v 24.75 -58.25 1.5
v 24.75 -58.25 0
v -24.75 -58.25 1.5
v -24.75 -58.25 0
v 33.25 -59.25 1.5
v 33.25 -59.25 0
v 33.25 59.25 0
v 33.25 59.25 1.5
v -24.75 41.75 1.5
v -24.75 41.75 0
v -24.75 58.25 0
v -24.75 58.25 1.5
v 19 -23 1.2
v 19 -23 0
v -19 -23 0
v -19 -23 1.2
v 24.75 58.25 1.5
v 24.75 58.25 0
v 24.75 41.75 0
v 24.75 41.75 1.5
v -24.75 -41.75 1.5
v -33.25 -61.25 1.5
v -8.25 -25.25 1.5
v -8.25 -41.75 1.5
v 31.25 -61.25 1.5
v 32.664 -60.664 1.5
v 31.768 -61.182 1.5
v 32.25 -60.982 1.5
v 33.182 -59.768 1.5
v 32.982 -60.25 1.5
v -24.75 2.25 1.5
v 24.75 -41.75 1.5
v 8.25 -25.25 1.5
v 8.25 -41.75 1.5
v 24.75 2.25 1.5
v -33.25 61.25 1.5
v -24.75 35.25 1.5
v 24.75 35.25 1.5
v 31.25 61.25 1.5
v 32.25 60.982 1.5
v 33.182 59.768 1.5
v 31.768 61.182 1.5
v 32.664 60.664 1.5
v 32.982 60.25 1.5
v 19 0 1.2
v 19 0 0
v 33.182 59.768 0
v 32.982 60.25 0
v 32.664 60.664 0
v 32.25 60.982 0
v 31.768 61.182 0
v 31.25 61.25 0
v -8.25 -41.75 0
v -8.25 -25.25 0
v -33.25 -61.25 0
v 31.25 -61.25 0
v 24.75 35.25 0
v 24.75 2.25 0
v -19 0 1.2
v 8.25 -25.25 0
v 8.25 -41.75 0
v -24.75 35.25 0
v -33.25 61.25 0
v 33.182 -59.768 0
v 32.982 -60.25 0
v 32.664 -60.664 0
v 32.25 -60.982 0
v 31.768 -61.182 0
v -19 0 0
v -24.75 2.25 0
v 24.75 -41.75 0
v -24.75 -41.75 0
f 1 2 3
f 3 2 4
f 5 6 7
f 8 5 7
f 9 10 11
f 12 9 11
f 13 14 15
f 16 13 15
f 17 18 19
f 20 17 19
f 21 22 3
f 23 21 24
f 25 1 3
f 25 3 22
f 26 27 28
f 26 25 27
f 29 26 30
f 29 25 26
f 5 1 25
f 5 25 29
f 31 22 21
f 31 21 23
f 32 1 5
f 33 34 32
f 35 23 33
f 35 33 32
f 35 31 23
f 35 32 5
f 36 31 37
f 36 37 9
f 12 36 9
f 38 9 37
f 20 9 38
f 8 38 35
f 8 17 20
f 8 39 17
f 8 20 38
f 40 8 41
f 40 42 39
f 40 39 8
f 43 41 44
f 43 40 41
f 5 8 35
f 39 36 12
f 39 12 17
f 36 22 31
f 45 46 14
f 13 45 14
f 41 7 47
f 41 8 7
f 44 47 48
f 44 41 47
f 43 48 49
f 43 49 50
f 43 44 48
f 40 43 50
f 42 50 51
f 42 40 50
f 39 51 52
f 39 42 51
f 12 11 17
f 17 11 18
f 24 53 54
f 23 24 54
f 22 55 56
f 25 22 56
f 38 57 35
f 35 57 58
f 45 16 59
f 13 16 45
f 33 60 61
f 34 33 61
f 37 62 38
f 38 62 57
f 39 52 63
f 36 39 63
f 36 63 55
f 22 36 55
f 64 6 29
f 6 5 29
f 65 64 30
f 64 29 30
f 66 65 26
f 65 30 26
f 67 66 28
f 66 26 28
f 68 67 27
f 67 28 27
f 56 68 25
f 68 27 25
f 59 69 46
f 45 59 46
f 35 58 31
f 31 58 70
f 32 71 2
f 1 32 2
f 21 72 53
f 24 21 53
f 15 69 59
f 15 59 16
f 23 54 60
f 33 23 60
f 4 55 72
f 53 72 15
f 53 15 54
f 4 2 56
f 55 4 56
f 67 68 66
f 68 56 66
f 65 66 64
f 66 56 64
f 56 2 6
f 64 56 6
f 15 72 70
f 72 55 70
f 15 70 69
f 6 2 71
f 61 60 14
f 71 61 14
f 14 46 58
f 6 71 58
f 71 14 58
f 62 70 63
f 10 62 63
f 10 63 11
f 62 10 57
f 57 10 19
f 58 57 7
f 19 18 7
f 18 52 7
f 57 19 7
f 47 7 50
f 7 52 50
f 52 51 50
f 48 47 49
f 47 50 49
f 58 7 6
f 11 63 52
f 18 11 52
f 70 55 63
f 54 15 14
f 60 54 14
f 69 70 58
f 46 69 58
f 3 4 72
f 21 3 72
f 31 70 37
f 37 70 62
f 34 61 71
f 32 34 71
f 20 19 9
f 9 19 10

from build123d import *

# Parameters (mm, degrees)
F1_DEPTH = 1.5
F2_W     = 19
F2_H     = 23
F3_DEPTH = 1.2
F4_R     = 2


with BuildPart() as f1:
    # F0 (on Top) → F1 (new body)
    with BuildSketch(Plane.XY):
        Polygon((33.25, -61.25), (33.25, 61.25), (0, 61.25), (-33.25, 61.25), (-33.25, -61.25), (0, -61.25), align=None)
        Polygon((24.75, -58.25), (0, -58.25), (-24.75, -58.25), (-24.75, -41.75), (-8.25, -41.75), (-8.25, -25.25), (8.25, -25.25), (8.25, -41.75), (24.75, -41.75), align=None, mode=Mode.SUBTRACT)
        Polygon((-24.75, 35.25), (0, 35.25), (24.75, 35.25), (24.75, 2.25), (-24.75, 2.25), align=None, mode=Mode.SUBTRACT)
        Polygon((-24.75, 58.25), (0, 58.25), (24.75, 58.25), (24.75, 41.75), (0, 41.75), (-24.75, 41.75), align=None, mode=Mode.SUBTRACT)
    extrude(amount=F1_DEPTH)

    # F2 (on face) → F3 (cut)
    with BuildSketch(Plane(origin=(0, 0, 0), x_dir=(1, 0, 0), z_dir=(0, 0, -1))):
        with Locations((9.5, 11.5)):
            Rectangle(F2_W, F2_H)
        with Locations((-9.5, 11.5)):
            Rectangle(F2_W, F2_H)
    extrude(amount=-F3_DEPTH, mode=Mode.SUBTRACT)

    # F4
    f4_edges = [f1.edges().sort_by_distance(p)[0] for p in [
        (33.25, -61.25, 0.75),
        (33.25, 61.25, 0.75),
    ]]
    fillet(f4_edges, radius=F4_R)


solid = f1.part
